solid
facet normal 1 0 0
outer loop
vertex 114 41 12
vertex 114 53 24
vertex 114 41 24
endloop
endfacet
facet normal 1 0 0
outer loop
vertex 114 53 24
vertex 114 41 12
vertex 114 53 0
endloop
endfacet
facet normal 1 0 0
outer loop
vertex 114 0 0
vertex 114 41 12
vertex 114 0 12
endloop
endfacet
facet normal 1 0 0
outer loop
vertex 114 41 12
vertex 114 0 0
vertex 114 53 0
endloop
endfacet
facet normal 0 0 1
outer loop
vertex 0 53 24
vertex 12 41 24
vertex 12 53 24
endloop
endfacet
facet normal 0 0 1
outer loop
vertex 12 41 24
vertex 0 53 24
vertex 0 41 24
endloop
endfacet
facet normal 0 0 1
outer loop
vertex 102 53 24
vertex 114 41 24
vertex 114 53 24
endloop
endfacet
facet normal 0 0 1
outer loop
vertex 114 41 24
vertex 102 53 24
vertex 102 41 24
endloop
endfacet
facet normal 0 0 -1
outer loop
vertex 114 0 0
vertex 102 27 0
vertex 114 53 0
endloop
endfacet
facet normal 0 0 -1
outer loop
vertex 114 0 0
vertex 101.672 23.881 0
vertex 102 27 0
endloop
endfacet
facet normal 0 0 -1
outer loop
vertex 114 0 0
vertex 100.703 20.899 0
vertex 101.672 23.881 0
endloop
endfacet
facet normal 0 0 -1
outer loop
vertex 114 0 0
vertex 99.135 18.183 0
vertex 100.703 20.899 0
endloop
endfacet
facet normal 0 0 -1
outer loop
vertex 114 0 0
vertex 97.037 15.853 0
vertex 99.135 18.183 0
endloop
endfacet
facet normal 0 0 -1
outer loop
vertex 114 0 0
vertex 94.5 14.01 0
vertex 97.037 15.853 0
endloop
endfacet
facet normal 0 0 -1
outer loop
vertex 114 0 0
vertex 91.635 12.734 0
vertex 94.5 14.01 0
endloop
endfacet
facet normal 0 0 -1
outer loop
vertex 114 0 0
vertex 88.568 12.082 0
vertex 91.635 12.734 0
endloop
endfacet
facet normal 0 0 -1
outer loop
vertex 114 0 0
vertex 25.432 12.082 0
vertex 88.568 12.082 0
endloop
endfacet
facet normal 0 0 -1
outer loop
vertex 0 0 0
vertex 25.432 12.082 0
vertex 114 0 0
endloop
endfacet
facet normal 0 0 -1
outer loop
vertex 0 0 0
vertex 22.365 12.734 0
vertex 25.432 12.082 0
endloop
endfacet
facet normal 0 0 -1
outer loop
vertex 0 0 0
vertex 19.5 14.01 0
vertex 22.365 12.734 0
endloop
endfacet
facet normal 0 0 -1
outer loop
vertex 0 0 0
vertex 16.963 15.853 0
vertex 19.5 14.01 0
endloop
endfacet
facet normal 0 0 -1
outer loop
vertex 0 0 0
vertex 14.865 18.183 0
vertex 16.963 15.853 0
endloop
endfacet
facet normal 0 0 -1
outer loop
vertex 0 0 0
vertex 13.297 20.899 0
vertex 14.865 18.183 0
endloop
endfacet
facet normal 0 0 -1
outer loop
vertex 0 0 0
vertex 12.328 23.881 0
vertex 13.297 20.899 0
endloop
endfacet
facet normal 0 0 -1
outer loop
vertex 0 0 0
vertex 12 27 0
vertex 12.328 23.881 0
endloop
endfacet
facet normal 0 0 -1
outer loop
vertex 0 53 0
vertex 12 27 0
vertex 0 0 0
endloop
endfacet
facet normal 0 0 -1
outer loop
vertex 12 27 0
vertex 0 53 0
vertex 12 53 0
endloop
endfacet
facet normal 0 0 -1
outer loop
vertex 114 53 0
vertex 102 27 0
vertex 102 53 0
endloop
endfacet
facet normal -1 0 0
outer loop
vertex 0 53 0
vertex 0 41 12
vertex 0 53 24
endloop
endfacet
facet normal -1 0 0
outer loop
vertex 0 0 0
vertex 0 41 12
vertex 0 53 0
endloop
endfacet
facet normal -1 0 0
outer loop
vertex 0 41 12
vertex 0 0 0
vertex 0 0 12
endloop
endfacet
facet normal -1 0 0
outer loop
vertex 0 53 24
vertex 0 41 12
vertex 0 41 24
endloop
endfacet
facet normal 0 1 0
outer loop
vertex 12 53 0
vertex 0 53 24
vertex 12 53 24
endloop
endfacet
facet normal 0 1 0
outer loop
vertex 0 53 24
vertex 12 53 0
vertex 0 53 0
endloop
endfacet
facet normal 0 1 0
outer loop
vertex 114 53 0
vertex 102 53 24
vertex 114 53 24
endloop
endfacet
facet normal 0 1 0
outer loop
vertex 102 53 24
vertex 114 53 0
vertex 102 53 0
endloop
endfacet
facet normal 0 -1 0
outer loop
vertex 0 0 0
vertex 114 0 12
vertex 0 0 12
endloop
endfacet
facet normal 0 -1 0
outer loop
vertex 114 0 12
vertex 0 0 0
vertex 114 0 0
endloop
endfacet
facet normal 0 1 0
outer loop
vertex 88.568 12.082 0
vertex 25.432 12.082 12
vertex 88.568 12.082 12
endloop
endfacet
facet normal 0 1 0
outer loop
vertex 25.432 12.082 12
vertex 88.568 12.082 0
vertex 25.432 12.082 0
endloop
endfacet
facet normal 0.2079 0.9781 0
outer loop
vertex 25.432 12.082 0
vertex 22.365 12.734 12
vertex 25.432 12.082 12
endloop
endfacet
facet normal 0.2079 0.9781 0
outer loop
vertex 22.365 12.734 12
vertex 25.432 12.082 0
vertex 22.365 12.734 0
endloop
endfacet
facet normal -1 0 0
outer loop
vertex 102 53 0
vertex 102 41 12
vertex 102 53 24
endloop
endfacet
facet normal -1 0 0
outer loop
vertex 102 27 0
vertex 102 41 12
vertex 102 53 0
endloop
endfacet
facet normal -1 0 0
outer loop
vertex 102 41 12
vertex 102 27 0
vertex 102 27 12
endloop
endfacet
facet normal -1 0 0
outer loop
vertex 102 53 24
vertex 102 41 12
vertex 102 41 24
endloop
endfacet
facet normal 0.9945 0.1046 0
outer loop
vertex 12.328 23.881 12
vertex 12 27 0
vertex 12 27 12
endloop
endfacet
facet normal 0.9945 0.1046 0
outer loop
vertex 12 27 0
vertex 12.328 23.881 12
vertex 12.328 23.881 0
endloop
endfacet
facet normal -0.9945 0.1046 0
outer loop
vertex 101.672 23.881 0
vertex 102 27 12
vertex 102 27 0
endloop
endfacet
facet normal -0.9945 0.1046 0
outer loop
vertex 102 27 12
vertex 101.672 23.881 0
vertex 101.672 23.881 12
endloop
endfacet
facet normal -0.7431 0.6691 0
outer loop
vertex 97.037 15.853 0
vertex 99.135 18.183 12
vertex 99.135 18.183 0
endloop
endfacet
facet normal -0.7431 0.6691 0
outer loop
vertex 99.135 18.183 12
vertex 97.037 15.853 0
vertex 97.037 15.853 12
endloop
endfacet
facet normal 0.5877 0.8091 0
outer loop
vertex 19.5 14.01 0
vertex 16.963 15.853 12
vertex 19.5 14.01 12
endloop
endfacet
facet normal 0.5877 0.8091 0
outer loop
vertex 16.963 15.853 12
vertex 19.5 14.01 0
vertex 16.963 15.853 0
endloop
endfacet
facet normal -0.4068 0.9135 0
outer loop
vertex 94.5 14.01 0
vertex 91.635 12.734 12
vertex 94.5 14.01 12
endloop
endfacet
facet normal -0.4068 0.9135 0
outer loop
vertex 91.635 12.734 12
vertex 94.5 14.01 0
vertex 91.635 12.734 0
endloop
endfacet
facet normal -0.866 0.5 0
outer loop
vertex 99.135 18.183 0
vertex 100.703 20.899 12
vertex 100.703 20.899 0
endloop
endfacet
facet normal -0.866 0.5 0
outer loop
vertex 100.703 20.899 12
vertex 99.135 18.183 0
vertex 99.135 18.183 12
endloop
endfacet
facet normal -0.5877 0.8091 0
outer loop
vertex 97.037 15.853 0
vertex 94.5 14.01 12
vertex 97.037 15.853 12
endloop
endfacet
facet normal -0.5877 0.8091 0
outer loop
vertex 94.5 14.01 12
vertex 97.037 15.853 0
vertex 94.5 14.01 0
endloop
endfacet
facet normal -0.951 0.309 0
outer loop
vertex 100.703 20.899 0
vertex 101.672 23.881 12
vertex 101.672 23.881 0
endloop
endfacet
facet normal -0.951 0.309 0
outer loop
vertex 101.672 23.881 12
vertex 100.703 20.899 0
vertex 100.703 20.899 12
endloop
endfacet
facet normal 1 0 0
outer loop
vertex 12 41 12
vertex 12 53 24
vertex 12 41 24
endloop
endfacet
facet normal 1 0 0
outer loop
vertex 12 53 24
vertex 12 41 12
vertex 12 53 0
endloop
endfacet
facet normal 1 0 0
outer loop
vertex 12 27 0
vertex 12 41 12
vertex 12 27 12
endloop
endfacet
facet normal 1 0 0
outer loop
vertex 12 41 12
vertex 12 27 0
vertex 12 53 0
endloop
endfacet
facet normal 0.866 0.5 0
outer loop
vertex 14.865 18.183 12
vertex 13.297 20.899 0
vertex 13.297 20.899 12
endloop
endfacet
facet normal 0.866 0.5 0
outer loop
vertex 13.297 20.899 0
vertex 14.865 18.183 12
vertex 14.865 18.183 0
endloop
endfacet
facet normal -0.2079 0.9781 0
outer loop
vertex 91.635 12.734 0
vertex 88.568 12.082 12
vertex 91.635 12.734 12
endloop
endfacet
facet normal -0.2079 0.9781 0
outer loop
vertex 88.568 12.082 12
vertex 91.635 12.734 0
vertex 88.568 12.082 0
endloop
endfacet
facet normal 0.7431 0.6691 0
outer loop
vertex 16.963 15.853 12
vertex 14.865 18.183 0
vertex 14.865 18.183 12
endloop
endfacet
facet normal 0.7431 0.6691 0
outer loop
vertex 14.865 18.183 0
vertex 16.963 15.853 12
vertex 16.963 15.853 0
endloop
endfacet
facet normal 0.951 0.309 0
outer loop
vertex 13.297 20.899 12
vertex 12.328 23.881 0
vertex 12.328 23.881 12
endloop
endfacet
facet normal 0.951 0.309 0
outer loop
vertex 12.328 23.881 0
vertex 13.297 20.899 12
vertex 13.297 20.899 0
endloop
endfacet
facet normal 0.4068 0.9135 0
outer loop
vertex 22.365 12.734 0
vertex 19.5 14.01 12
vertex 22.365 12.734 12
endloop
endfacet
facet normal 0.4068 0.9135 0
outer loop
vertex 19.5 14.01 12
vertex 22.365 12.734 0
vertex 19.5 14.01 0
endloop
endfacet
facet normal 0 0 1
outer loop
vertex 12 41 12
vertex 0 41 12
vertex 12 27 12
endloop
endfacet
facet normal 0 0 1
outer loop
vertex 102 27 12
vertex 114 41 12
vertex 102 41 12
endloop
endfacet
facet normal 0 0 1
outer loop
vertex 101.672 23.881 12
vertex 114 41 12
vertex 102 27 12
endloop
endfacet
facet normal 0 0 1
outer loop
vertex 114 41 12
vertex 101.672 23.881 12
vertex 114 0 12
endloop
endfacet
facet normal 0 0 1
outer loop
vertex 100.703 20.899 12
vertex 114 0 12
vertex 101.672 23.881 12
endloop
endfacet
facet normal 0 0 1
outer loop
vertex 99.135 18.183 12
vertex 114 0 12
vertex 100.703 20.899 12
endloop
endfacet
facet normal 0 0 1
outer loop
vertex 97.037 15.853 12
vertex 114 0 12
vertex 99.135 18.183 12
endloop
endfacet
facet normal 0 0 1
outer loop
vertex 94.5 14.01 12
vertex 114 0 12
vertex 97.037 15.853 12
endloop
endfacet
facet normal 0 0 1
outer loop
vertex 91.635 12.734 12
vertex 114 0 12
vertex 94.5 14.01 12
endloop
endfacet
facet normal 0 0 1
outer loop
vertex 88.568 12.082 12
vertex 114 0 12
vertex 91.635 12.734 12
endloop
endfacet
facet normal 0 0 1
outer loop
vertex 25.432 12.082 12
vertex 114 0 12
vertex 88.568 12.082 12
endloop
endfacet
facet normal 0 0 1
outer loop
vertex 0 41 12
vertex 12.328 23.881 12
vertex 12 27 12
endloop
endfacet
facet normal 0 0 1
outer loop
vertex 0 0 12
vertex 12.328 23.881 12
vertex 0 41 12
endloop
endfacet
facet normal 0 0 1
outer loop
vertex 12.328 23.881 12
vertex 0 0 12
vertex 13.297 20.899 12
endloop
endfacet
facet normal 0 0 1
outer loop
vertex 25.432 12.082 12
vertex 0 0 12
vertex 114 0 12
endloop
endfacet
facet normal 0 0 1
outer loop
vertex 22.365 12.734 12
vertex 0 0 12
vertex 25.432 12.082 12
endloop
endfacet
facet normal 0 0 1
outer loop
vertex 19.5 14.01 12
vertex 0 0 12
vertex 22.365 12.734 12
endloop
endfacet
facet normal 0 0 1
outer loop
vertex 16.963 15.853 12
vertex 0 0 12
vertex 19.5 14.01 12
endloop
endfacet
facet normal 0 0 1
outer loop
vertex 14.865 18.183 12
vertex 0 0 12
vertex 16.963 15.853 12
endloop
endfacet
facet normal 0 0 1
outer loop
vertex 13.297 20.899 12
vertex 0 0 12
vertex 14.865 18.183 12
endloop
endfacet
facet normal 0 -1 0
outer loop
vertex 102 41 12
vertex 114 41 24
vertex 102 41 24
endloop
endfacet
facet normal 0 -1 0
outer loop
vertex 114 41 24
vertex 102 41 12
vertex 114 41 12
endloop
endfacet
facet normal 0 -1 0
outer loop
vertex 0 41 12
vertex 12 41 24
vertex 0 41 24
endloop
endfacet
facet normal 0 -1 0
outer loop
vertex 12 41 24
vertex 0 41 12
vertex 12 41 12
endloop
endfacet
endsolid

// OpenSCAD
//Brian Check
//bcheck555(at)gmail(dot)com
//Customizable jig for mortising hinges
//roundedcube module credit https://www.youtube.com/watch?v=gKOkJWiTgAY

hingeLength=90;
hingeWidth=29;
Thick=12;
Edge=12;
cornerRadius=15;

difference(){
cube(size=[hingeLength+(Edge*2),hingeWidth+(Edge*2),Thick+Edge]);
    translate([Edge,Edge,0]){
        roundedcube(hingeLength,(hingeWidth+Edge*2),Thick+Edge,cornerRadius);
    }
    translate([0,-Edge,Thick]){
        cube(size=[hingeLength+Edge*2,(hingeWidth+Edge*2),Thick*2]);
    }
}

module roundedcube(xdim ,ydim ,zdim,rdim){
hull(){
translate([rdim,rdim,0])cylinder(h=zdim,r=rdim);
translate([xdim-rdim,rdim,0])cylinder(h=zdim,r=rdim);

translate([0,ydim,0])cube(size=[1,1,zdim]);
translate([xdim-1,ydim,0])cube(size=[1,1,zdim]);
}
}
